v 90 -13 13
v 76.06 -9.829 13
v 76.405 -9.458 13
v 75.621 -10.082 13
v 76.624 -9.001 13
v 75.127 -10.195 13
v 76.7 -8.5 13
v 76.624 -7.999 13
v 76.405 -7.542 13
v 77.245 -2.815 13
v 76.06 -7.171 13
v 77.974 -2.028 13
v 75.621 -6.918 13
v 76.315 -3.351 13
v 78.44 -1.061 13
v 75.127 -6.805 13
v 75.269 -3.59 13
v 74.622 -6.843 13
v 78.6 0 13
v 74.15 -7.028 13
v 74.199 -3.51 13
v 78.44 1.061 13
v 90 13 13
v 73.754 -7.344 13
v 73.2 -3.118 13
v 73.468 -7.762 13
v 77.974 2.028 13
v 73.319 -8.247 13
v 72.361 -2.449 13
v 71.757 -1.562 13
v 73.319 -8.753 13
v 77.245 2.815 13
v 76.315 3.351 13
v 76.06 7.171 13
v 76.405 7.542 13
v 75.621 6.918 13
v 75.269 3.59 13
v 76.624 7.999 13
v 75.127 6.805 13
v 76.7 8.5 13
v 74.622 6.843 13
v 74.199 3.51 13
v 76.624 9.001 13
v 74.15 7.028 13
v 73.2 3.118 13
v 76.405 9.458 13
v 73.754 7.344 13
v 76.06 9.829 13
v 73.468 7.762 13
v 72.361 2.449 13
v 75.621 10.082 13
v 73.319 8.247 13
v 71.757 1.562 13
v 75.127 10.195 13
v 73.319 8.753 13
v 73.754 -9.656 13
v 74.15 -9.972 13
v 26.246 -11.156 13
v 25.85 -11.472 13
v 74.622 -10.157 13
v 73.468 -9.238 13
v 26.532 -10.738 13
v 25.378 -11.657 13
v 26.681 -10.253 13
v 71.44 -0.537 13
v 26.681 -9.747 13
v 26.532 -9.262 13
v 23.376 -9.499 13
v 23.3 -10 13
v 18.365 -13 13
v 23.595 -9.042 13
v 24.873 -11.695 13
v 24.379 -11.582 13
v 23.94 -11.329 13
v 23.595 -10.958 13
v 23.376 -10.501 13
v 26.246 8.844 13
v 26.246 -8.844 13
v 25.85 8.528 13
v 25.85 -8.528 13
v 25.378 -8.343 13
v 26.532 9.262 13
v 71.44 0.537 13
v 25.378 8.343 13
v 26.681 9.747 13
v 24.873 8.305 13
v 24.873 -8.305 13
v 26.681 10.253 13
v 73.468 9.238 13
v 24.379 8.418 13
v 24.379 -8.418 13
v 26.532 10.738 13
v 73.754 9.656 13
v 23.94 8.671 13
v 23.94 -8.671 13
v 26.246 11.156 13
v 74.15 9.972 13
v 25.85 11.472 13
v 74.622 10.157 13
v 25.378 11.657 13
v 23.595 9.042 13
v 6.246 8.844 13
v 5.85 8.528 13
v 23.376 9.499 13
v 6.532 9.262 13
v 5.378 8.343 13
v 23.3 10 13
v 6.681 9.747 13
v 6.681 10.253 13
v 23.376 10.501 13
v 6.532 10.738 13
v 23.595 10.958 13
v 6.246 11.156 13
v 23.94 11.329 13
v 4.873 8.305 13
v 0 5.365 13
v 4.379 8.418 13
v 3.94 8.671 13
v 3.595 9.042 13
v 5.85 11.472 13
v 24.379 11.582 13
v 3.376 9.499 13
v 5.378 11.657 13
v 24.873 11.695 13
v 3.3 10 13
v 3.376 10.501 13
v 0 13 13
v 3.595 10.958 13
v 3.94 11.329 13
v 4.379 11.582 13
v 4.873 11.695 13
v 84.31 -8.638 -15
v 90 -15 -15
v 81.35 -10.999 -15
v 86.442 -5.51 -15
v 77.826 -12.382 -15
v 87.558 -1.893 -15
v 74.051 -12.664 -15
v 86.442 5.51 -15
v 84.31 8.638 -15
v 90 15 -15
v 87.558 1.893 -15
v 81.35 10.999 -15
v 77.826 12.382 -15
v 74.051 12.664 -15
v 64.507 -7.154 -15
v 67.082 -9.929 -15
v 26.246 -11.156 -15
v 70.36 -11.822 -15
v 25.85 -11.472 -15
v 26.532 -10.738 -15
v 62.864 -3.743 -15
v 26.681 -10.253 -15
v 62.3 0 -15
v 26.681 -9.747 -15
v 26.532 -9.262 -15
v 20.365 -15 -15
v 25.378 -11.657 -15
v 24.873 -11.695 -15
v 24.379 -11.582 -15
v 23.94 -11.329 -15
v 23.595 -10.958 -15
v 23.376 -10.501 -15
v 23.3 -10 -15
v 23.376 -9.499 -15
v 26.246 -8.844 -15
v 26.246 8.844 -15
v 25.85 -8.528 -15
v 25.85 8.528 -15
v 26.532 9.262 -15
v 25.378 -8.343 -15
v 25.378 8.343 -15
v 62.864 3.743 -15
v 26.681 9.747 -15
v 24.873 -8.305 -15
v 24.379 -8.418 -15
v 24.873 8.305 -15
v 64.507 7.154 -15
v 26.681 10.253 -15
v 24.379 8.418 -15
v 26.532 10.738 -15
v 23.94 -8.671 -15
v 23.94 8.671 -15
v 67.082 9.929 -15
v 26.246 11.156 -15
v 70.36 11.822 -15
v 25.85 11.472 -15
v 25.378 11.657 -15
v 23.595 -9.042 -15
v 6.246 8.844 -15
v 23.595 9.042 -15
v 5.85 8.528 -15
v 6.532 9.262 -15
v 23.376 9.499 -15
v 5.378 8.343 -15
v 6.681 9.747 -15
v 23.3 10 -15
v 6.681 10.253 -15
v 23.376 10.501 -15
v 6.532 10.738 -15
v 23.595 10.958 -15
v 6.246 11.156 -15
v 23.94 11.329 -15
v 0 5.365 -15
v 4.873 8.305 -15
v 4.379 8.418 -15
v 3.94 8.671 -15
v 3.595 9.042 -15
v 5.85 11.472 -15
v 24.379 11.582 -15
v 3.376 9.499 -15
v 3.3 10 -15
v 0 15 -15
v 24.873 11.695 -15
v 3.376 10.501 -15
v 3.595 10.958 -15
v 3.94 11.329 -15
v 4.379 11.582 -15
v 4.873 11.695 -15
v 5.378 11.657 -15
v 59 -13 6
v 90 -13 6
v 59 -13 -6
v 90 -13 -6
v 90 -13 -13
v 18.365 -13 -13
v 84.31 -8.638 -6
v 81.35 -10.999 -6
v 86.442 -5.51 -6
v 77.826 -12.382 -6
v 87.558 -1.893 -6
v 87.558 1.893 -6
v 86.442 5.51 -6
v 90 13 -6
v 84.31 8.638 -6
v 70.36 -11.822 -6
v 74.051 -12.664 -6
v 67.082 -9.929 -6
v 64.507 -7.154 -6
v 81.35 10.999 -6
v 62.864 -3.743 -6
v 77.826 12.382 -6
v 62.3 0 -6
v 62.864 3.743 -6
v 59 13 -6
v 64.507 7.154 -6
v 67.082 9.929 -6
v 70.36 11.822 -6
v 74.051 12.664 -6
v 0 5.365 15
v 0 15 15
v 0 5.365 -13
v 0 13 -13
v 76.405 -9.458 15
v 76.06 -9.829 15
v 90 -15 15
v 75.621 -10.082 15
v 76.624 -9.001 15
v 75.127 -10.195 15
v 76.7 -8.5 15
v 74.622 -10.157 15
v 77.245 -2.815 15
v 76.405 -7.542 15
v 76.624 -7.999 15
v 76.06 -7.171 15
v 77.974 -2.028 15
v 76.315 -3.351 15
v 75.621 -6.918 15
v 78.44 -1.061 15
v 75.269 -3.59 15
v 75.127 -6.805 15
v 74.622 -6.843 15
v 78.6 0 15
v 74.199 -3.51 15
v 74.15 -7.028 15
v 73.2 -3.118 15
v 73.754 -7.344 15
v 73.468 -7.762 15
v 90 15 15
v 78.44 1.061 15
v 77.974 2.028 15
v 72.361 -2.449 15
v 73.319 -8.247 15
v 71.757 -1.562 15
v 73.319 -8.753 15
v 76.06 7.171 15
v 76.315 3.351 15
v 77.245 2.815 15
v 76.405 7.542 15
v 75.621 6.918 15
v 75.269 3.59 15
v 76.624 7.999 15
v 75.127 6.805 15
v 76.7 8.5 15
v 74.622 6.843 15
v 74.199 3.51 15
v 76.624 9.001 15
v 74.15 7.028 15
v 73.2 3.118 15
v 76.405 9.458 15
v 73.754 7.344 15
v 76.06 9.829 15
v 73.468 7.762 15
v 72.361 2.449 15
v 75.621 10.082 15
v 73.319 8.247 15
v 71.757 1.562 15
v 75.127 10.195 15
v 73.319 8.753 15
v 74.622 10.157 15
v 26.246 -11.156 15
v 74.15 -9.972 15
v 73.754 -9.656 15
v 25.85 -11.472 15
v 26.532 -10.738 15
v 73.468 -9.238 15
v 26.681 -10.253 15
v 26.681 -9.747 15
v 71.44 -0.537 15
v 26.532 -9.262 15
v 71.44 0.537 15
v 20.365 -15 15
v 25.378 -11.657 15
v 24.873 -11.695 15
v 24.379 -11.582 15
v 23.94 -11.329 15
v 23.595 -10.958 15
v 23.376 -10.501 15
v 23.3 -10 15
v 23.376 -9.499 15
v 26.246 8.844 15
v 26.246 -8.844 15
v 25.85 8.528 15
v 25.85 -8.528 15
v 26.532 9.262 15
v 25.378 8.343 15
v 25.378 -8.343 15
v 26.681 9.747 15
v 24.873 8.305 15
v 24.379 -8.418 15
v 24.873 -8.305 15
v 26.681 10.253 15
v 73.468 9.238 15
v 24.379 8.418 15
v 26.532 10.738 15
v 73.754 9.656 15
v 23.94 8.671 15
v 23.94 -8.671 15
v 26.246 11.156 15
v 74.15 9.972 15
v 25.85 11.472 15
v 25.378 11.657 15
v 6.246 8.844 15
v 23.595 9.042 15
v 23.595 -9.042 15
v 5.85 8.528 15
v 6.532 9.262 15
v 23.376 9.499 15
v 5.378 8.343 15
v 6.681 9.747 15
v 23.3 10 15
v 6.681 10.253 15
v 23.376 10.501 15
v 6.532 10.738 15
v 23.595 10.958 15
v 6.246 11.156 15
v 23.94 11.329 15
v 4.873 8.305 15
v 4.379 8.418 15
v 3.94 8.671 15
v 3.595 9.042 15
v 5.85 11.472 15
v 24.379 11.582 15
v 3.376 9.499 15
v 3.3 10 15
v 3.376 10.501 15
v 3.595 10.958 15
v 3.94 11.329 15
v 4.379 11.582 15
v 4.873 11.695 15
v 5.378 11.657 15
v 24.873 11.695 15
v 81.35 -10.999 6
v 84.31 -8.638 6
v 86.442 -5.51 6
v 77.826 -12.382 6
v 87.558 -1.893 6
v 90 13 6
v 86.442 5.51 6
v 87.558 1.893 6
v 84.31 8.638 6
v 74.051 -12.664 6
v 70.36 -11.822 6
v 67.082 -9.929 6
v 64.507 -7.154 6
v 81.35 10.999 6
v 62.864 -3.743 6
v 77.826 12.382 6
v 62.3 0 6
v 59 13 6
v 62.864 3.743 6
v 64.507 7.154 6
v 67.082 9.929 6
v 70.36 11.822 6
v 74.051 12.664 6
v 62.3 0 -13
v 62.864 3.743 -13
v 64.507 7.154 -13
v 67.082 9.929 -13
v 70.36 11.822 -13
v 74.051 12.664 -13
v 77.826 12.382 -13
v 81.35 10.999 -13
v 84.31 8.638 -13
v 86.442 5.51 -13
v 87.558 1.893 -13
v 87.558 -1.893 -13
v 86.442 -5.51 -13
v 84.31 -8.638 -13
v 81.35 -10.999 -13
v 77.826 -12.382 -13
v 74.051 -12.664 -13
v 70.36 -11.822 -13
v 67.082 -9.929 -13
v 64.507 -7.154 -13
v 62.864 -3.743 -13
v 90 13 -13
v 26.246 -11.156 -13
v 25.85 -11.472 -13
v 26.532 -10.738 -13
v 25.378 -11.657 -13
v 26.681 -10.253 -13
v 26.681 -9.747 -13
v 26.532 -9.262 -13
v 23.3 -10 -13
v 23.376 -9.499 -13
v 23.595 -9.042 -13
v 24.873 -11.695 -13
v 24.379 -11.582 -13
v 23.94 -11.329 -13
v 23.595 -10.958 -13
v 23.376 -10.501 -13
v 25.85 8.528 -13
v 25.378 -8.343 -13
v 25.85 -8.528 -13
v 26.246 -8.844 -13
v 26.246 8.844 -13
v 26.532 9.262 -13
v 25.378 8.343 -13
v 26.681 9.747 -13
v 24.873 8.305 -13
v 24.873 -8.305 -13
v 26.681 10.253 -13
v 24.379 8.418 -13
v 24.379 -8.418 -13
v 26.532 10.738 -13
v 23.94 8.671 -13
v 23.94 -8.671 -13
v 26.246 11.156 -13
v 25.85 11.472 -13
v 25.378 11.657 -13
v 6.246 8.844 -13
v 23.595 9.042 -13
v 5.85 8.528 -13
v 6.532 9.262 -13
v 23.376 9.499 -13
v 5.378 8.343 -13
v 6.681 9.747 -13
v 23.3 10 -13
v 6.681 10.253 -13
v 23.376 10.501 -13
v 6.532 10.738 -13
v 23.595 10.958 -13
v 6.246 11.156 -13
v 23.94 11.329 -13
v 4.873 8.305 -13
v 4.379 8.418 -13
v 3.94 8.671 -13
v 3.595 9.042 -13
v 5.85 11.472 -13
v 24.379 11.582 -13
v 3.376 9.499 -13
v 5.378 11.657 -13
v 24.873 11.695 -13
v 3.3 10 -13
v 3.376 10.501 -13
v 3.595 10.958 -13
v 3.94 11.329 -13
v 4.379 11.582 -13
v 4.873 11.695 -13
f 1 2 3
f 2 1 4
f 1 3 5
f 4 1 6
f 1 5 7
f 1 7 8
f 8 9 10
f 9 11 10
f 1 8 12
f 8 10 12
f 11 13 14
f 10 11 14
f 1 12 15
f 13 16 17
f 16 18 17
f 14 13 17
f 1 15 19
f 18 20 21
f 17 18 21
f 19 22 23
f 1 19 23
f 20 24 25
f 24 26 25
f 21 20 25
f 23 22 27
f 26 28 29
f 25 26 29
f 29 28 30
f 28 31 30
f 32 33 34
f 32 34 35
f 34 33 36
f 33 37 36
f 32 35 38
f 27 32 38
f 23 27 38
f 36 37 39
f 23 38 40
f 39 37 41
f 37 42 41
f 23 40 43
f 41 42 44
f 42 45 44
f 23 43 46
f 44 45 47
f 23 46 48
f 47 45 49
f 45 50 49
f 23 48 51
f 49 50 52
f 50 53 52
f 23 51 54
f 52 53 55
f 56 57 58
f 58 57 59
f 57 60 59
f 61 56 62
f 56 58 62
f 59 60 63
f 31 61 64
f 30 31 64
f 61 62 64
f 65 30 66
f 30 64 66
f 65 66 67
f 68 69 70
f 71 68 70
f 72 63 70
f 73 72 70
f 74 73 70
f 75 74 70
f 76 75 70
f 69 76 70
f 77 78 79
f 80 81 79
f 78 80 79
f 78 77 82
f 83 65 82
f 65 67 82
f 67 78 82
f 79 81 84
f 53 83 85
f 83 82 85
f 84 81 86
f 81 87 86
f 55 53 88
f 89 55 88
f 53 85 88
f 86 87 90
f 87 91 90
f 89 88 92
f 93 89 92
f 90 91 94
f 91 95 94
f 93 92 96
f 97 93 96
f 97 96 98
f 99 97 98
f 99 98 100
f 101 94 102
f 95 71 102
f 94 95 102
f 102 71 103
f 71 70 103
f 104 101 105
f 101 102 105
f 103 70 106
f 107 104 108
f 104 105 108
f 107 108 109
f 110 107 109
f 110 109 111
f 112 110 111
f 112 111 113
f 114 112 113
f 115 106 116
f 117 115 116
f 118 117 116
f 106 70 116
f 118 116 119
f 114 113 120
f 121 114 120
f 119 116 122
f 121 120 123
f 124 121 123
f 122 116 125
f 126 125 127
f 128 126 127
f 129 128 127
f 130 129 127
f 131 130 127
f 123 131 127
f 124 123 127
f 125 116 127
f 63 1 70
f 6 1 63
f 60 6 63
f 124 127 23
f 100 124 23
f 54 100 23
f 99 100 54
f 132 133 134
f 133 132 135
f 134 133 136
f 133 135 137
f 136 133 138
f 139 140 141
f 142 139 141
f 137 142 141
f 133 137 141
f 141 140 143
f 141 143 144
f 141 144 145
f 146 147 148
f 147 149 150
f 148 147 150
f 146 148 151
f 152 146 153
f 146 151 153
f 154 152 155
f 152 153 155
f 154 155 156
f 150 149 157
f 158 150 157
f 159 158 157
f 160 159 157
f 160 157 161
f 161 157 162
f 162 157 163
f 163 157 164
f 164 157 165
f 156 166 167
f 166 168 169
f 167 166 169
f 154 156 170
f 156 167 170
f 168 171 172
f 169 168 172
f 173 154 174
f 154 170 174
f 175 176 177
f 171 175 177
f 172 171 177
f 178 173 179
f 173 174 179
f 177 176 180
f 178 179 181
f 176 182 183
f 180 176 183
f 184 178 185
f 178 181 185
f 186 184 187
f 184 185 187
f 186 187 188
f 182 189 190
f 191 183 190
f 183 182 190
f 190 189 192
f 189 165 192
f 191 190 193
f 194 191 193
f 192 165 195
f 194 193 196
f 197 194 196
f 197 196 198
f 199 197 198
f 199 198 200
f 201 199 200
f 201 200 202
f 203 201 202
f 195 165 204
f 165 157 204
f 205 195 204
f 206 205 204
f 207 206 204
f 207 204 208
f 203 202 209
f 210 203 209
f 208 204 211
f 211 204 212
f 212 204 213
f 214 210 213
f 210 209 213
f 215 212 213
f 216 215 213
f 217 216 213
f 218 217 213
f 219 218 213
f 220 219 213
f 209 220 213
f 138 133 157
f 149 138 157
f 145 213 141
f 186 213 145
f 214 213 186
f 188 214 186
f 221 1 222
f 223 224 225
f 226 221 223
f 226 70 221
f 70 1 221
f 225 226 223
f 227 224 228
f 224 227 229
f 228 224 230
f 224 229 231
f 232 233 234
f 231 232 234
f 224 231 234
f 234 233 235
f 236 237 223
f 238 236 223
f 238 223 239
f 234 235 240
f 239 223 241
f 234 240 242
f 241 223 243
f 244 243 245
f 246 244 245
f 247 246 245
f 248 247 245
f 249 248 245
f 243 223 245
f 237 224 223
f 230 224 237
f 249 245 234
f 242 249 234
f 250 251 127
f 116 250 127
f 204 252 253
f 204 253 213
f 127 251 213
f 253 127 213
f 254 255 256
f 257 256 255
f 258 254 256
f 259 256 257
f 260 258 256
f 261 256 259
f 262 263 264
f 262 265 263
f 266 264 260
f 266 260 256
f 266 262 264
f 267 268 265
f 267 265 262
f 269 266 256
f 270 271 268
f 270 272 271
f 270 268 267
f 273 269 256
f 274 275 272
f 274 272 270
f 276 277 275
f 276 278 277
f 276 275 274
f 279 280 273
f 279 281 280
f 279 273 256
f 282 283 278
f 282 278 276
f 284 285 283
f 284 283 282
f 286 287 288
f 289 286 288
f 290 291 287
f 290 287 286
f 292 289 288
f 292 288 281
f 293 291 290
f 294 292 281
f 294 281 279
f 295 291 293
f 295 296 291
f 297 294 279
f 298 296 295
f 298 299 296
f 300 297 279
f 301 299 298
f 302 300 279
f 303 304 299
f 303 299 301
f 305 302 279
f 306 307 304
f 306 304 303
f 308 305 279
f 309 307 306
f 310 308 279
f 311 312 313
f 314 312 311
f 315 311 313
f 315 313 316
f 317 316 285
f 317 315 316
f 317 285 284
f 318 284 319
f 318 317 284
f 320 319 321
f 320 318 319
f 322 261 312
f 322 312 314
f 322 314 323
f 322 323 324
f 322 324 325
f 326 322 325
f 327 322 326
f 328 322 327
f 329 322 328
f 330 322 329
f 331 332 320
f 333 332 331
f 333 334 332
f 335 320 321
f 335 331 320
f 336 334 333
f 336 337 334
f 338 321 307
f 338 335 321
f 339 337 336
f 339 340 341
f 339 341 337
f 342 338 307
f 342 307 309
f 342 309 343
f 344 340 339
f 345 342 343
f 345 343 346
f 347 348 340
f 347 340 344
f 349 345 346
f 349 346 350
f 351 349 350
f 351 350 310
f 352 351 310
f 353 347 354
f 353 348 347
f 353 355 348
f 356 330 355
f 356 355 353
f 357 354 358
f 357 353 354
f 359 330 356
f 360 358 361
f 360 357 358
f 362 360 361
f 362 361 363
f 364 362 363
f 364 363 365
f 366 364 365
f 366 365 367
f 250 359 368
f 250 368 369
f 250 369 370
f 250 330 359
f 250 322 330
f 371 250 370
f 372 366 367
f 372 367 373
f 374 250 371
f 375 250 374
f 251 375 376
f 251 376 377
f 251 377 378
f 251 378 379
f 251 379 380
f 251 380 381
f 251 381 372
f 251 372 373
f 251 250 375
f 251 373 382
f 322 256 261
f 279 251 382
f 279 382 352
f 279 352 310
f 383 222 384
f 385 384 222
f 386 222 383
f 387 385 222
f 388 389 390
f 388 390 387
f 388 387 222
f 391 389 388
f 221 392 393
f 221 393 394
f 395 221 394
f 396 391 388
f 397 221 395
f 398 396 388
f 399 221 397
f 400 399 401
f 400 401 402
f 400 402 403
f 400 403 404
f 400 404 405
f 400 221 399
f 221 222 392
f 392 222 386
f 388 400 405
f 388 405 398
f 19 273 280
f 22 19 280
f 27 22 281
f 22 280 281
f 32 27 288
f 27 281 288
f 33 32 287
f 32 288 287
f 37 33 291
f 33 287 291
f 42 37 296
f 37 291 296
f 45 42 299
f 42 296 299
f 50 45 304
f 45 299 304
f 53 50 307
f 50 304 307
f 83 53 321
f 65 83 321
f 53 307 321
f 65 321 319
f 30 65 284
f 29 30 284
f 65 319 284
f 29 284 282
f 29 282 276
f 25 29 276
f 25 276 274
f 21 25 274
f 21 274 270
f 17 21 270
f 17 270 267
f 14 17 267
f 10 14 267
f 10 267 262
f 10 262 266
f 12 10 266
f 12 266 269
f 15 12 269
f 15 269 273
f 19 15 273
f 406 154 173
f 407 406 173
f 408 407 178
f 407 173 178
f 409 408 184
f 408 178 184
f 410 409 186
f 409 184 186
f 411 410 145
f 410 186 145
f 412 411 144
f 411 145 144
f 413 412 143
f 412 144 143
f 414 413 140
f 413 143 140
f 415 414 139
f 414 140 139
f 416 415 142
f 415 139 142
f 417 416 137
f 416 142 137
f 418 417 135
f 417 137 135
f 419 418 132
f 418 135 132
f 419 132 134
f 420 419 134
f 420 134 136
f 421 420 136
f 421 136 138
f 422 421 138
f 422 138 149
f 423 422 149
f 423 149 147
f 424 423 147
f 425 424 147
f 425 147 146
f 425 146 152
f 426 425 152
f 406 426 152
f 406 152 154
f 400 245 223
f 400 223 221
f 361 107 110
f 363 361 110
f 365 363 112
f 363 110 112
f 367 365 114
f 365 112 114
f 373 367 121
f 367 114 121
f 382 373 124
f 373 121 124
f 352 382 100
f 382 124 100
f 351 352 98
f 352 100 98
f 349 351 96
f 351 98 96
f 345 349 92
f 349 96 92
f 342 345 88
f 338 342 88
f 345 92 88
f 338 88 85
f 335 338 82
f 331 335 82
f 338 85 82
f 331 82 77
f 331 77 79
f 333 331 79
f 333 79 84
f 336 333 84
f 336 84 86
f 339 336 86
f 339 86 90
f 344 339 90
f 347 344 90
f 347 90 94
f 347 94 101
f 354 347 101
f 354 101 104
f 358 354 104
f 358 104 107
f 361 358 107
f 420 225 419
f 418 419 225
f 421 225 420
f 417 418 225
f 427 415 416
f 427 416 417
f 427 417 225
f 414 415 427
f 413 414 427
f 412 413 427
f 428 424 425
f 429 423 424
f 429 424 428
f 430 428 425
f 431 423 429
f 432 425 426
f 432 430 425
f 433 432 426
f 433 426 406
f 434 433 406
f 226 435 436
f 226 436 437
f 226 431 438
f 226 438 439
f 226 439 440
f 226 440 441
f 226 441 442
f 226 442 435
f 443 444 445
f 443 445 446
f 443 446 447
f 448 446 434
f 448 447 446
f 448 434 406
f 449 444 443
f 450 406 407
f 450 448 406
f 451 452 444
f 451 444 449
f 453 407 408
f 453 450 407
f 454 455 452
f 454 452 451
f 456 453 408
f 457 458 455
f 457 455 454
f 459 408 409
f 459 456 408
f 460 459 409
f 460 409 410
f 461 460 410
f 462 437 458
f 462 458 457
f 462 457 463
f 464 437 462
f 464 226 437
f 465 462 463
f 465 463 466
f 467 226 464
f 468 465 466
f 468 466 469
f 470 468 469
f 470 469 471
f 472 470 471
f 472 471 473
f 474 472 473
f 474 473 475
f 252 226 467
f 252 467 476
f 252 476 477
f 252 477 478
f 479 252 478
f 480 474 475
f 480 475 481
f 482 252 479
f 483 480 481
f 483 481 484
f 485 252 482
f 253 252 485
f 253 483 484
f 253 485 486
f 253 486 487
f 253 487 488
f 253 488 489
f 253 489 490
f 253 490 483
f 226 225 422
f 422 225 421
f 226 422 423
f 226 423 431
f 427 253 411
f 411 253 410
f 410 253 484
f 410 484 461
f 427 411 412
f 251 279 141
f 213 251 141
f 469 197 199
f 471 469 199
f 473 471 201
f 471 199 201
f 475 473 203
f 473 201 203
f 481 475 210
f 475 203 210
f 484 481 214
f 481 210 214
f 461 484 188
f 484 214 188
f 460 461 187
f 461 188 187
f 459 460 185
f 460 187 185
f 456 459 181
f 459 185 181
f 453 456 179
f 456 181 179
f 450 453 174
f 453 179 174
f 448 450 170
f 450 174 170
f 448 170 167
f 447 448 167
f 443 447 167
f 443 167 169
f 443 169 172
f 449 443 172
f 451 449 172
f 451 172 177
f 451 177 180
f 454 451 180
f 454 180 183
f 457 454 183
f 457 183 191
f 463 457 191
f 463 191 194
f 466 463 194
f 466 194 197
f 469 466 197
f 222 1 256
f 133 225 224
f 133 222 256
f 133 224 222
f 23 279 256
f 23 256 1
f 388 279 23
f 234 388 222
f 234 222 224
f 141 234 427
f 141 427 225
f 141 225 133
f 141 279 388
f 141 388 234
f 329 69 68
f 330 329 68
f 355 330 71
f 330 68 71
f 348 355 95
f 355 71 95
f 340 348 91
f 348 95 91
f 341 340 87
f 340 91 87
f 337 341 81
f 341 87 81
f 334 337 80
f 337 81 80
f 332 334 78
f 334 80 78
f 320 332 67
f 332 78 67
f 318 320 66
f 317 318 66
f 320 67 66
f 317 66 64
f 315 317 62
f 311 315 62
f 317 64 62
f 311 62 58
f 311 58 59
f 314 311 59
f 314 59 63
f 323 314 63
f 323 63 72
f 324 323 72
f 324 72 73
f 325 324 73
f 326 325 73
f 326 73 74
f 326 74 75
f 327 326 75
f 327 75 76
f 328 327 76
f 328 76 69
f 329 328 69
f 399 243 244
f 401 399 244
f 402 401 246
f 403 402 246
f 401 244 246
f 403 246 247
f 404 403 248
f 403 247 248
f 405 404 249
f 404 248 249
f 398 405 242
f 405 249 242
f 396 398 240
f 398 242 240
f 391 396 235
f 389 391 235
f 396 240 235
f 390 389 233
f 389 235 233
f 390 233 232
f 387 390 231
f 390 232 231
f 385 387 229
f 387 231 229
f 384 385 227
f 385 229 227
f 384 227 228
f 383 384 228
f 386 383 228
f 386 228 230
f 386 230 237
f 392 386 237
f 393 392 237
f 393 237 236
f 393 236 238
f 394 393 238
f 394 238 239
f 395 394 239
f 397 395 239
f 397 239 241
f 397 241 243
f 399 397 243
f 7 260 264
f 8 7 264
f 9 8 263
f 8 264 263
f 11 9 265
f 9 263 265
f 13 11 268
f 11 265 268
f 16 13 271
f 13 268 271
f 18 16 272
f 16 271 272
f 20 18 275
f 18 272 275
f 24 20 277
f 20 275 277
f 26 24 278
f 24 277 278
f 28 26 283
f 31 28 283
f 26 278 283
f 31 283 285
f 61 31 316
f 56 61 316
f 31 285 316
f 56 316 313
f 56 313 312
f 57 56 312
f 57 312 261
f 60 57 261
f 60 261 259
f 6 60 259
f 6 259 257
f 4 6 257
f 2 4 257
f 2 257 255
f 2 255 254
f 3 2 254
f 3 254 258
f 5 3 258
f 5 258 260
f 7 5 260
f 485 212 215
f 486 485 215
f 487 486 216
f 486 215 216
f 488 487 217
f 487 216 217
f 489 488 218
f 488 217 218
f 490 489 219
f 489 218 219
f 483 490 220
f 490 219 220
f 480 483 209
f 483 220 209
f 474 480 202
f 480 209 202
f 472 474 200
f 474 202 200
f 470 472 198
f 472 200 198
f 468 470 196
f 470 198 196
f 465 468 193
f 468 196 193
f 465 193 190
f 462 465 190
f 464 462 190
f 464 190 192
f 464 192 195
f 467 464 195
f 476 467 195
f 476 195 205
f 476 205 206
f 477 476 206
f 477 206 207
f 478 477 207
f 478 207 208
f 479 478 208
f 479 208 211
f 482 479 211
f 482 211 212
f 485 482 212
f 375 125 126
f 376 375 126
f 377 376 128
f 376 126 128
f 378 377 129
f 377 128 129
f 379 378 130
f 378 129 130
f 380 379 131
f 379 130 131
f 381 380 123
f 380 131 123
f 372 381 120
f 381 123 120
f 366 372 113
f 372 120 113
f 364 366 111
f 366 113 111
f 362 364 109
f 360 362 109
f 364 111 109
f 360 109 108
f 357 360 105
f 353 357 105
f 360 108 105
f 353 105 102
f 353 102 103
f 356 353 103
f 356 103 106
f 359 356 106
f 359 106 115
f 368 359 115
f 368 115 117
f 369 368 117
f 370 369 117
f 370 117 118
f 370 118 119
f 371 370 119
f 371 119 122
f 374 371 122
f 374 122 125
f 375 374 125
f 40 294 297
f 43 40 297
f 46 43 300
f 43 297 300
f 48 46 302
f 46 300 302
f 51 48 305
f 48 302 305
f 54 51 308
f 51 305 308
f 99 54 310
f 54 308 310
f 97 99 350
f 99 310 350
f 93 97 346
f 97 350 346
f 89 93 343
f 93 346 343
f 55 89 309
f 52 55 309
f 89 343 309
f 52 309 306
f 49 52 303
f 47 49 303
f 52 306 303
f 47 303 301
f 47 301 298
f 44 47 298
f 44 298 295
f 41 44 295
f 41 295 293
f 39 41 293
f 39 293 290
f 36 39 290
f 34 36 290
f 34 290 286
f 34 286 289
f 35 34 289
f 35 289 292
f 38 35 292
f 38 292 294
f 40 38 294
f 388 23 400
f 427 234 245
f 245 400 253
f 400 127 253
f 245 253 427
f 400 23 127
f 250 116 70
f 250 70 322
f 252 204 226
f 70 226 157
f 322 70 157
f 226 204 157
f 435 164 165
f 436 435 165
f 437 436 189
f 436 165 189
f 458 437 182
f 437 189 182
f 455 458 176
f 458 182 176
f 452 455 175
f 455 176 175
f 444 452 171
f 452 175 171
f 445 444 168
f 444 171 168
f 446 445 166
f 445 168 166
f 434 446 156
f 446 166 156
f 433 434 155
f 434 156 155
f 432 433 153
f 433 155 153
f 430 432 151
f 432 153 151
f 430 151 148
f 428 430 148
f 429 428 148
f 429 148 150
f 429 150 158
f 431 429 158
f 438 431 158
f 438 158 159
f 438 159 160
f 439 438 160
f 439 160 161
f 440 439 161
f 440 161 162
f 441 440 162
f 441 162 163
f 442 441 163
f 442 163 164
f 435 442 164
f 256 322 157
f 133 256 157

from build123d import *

# Parameters (mm, degrees)
SKETCH1_W               = 30
SKETCH1_H               = 30
SKETCH1_W_2             = 7
SKETCH1_H_2             = 26
BOSS_EXTRUDE3_DEPTH     = 90
SKETCH6_R               = 12.7
CUT_EXTRUDE5_DEPTH      = 23
SKETCH8_R               = 3.6
SKETCH8_R_2             = 1.7
CUT_EXTRUDE6_DEPTH      = 17
SKETCH9_W               = 12
SKETCH9_H               = 26
CUT_EXTRUDE7_DEPTH      = 59
M3_CLEARANCE_HOLE1_D    = 3.4
CUT_EXTRUDE8_DEPTH      = 28
CUT_EXTRUDE8_DEPTH_BACK = 26


with BuildPart() as part:
    # Sketch1 → Boss-Extrude3 (new body)
    with BuildSketch(Plane(origin=(0, 0, 0), x_dir=(0, 0, -1), z_dir=(1, 0, 0))):
        Rectangle(SKETCH1_W, SKETCH1_H)
        with Locations((-9.5, 0)):
            Rectangle(SKETCH1_W_2, SKETCH1_H_2, mode=Mode.SUBTRACT)
        with Locations((9.5, 0)):
            Rectangle(SKETCH1_W_2, SKETCH1_H_2, mode=Mode.SUBTRACT)
    extrude(amount=BOSS_EXTRUDE3_DEPTH)

    # Sketch6 → Cut-Extrude5 (cut)
    with BuildSketch(Plane(origin=(0, 0, -15), x_dir=(-1, 0, 0), z_dir=(0, 0, -1))):
        with Locations((-75, 0)):
            Circle(SKETCH6_R)
    extrude(amount=-CUT_EXTRUDE5_DEPTH, mode=Mode.SUBTRACT)

    # Sketch8 → Cut-Extrude6 (cut)
    with BuildSketch(Plane.XY.offset(15)):
        with Locations((75, 0)):
            Circle(SKETCH8_R)
        with Locations((75, 8.5)):
            Circle(SKETCH8_R_2)
        with Locations((75, -8.5)):
            Circle(SKETCH8_R_2)
    extrude(amount=-CUT_EXTRUDE6_DEPTH, mode=Mode.SUBTRACT)

    # Sketch9 → Cut-Extrude7 (cut)
    with BuildSketch(Plane.ZY):
        Rectangle(SKETCH9_W, SKETCH9_H)
    extrude(amount=-CUT_EXTRUDE7_DEPTH, mode=Mode.SUBTRACT)

    # M3 Clearance Hole1 (through all)
    with Locations(Plane.XY.offset(15)):
        with Locations((25, 10), (5, -10), (25, -10), (5, 10)):
            Hole(M3_CLEARANCE_HOLE1_D / 2)

    # Sketch13 → Cut-Extrude8 (cut, two sides: drawn at the far end of the back side and taken through both)
    with BuildSketch(Plane.XY.offset(-CUT_EXTRUDE8_DEPTH_BACK)):
        Polygon((0, -15), (20.364675298, -15), (0, 5.364675298), align=None)
    extrude(amount=CUT_EXTRUDE8_DEPTH + CUT_EXTRUDE8_DEPTH_BACK, mode=Mode.SUBTRACT)


solid = part.part
